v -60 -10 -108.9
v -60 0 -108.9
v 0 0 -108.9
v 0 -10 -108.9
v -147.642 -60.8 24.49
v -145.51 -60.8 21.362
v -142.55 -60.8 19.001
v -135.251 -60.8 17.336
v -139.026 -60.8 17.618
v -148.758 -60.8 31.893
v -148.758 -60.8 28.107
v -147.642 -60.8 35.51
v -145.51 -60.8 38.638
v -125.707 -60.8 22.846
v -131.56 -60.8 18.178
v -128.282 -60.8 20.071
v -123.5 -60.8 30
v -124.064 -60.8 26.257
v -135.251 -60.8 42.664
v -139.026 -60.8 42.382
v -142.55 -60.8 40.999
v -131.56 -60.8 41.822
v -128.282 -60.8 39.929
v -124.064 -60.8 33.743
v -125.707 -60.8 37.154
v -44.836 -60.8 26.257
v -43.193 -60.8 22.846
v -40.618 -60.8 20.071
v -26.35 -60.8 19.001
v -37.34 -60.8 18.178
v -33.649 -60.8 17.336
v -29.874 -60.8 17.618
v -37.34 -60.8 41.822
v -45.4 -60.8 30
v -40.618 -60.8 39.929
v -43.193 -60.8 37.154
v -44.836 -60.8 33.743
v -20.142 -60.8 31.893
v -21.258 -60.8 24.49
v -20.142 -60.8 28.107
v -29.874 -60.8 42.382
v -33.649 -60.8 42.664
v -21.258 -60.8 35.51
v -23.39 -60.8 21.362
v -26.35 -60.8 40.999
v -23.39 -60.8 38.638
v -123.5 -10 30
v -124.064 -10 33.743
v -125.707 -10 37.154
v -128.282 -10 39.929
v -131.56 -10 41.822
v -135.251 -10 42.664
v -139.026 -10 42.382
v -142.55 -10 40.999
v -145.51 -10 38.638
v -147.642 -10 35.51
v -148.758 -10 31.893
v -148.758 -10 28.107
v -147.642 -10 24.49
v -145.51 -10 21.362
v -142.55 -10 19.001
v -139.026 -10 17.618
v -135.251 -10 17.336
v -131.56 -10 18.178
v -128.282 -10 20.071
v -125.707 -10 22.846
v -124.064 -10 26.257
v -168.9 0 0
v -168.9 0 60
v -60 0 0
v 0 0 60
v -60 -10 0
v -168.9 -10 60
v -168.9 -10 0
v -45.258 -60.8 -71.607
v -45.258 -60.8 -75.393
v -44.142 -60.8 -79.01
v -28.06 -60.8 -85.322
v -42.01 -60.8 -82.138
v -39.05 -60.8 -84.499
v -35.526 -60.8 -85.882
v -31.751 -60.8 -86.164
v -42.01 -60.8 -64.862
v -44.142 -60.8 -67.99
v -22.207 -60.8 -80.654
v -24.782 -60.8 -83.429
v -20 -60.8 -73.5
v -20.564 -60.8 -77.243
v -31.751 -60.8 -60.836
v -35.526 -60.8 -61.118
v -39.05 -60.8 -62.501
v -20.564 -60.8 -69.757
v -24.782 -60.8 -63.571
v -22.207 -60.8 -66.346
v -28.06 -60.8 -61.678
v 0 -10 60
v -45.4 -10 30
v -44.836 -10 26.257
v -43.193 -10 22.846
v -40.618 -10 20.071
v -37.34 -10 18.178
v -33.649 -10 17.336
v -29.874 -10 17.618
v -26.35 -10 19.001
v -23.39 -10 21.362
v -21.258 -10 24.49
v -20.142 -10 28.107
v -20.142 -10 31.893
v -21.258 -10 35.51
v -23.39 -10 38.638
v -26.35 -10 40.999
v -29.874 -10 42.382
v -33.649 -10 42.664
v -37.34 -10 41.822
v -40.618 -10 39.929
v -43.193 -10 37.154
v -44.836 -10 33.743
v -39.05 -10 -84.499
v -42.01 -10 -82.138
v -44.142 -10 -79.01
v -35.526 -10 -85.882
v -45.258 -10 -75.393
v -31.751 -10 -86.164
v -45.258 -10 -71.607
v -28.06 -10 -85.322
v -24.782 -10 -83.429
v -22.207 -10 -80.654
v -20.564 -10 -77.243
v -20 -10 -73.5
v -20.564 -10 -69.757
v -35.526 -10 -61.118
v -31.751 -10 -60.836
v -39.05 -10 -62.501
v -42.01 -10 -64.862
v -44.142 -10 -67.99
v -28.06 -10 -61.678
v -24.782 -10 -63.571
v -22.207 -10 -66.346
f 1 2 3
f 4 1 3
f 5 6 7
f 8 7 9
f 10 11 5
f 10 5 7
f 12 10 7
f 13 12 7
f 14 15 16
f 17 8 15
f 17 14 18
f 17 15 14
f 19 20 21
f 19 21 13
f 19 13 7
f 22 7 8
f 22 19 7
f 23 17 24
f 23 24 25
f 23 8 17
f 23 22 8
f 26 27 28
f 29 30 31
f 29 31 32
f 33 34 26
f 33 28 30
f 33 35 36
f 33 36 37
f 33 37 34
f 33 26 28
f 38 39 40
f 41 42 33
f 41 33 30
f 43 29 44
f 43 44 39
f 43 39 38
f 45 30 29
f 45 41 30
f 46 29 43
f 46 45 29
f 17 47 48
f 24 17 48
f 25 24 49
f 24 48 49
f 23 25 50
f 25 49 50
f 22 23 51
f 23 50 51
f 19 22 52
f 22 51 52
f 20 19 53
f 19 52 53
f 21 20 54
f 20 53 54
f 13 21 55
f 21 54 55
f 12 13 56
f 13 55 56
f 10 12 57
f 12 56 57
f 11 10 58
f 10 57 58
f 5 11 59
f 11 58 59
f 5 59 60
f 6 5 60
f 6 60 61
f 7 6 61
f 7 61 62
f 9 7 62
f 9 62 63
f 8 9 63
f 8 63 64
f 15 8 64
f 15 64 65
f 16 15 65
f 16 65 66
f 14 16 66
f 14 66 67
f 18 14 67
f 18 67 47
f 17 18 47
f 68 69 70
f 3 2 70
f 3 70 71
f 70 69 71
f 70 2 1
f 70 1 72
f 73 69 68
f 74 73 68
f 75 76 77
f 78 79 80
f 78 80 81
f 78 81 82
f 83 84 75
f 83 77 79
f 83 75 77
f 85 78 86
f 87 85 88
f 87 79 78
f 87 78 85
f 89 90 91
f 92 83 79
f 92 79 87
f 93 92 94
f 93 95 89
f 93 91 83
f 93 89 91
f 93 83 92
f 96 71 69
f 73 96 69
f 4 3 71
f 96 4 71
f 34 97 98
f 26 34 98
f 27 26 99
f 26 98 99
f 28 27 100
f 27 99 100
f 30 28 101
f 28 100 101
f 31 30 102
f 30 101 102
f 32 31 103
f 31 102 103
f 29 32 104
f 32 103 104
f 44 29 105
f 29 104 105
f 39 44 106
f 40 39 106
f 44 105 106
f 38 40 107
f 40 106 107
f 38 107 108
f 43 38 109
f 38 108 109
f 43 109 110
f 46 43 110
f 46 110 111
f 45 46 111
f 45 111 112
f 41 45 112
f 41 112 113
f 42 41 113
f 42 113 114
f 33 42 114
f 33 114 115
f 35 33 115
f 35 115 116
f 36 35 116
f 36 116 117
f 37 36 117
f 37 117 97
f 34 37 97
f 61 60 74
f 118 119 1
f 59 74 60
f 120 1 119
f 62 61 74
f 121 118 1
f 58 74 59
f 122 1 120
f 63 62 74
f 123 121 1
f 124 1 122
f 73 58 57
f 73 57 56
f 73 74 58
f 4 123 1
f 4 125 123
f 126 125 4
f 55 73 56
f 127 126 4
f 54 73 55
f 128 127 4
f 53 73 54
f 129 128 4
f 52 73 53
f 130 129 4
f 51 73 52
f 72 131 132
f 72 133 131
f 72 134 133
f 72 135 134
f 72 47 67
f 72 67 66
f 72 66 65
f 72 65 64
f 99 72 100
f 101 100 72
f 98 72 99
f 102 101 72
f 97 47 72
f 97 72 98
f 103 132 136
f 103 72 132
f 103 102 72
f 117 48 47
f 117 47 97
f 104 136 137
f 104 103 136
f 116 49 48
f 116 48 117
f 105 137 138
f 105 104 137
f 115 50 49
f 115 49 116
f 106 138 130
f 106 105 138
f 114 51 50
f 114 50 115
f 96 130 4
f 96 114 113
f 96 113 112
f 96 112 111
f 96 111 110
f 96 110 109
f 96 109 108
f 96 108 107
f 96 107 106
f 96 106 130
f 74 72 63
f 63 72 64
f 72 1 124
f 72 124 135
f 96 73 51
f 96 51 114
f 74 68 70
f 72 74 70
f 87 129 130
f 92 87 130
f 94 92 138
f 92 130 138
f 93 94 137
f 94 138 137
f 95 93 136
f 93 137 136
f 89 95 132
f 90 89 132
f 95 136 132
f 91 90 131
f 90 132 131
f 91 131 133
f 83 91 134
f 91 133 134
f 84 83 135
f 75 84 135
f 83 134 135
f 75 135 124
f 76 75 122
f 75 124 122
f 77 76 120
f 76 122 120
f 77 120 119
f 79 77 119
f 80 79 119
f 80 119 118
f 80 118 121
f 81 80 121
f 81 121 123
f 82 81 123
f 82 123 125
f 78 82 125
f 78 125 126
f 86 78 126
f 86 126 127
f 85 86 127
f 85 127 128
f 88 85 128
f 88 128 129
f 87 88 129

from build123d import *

# Parameters (mm, degrees)
F0_W     = 60
F0_H     = 108.9
F0_R     = 12.7
F1_DEPTH = 10
F2_DEPTH = 60.8


with BuildPart() as f1:
    # F0 (on Front) → F1 (new body)
    with BuildSketch(Plane.XZ):
        with BuildLine():
            Line((-60, 60), (-168.9, 60))
            Line((-168.9, 60), (-168.9, 30))
            Line((-168.9, 30), (-148.9, 30))
            ThreePointArc((-148.9, 30), (-136.2, 42.7), (-123.5, 30))
            Line((-123.5, 30), (-60, 30))
            Line((-60, 30), (-60, 60))
        make_face()
        with BuildLine():
            Line((0, 60), (-60, 60))
            Line((-60, 60), (-60, 30))
            Line((-60, 30), (-45.4, 30))
            ThreePointArc((-45.4, 30), (-32.7, 42.7), (-20, 30))
            Line((-20, 30), (0, 30))
            Line((0, 30), (0, 60))
        make_face()
        with BuildLine():
            Line((-148.9, 30), (-168.9, 30))
            Line((-168.9, 30), (-168.9, 0))
            Line((-168.9, 0), (-60, 0))
            Line((-60, 0), (-60, 30))
            Line((-60, 30), (-123.5, 30))
            ThreePointArc((-123.5, 30), (-136.2, 17.3), (-148.9, 30))
        make_face()
        with BuildLine():
            Line((-45.4, 30), (-60, 30))
            Line((-60, 30), (-60, 0))
            Line((-60, 0), (0, 0))
            Line((0, 0), (0, 30))
            Line((0, 30), (-20, 30))
            ThreePointArc((-20, 30), (-32.7, 17.3), (-45.4, 30))
        make_face()
        with Locations((-30, -54.45)):
            Rectangle(F0_W, F0_H)
        with Locations((-32.7, -73.5)):
            Circle(F0_R, mode=Mode.SUBTRACT)
    extrude(amount=F1_DEPTH)

    # F0 (on Front) → F2 (join)
    with BuildSketch(Plane.XZ):
        with BuildLine():
            Line((-123.5, 30), (-148.9, 30))
            ThreePointArc((-148.9, 30), (-136.2, 17.3), (-123.5, 30))
        make_face()
        with BuildLine():
            ThreePointArc((-123.5, 30), (-136.2, 42.7), (-148.9, 30))
            Line((-148.9, 30), (-123.5, 30))
        make_face()
        with BuildLine():
            ThreePointArc((-20, 30), (-32.7, 42.7), (-45.4, 30))
            Line((-45.4, 30), (-20, 30))
        make_face()
        with BuildLine():
            Line((-20, 30), (-45.4, 30))
            ThreePointArc((-45.4, 30), (-32.7, 17.3), (-20, 30))
        make_face()
        with Locations((-32.7, -73.5)):
            Circle(F0_R)
    extrude(amount=F2_DEPTH)


solid = f1.part
